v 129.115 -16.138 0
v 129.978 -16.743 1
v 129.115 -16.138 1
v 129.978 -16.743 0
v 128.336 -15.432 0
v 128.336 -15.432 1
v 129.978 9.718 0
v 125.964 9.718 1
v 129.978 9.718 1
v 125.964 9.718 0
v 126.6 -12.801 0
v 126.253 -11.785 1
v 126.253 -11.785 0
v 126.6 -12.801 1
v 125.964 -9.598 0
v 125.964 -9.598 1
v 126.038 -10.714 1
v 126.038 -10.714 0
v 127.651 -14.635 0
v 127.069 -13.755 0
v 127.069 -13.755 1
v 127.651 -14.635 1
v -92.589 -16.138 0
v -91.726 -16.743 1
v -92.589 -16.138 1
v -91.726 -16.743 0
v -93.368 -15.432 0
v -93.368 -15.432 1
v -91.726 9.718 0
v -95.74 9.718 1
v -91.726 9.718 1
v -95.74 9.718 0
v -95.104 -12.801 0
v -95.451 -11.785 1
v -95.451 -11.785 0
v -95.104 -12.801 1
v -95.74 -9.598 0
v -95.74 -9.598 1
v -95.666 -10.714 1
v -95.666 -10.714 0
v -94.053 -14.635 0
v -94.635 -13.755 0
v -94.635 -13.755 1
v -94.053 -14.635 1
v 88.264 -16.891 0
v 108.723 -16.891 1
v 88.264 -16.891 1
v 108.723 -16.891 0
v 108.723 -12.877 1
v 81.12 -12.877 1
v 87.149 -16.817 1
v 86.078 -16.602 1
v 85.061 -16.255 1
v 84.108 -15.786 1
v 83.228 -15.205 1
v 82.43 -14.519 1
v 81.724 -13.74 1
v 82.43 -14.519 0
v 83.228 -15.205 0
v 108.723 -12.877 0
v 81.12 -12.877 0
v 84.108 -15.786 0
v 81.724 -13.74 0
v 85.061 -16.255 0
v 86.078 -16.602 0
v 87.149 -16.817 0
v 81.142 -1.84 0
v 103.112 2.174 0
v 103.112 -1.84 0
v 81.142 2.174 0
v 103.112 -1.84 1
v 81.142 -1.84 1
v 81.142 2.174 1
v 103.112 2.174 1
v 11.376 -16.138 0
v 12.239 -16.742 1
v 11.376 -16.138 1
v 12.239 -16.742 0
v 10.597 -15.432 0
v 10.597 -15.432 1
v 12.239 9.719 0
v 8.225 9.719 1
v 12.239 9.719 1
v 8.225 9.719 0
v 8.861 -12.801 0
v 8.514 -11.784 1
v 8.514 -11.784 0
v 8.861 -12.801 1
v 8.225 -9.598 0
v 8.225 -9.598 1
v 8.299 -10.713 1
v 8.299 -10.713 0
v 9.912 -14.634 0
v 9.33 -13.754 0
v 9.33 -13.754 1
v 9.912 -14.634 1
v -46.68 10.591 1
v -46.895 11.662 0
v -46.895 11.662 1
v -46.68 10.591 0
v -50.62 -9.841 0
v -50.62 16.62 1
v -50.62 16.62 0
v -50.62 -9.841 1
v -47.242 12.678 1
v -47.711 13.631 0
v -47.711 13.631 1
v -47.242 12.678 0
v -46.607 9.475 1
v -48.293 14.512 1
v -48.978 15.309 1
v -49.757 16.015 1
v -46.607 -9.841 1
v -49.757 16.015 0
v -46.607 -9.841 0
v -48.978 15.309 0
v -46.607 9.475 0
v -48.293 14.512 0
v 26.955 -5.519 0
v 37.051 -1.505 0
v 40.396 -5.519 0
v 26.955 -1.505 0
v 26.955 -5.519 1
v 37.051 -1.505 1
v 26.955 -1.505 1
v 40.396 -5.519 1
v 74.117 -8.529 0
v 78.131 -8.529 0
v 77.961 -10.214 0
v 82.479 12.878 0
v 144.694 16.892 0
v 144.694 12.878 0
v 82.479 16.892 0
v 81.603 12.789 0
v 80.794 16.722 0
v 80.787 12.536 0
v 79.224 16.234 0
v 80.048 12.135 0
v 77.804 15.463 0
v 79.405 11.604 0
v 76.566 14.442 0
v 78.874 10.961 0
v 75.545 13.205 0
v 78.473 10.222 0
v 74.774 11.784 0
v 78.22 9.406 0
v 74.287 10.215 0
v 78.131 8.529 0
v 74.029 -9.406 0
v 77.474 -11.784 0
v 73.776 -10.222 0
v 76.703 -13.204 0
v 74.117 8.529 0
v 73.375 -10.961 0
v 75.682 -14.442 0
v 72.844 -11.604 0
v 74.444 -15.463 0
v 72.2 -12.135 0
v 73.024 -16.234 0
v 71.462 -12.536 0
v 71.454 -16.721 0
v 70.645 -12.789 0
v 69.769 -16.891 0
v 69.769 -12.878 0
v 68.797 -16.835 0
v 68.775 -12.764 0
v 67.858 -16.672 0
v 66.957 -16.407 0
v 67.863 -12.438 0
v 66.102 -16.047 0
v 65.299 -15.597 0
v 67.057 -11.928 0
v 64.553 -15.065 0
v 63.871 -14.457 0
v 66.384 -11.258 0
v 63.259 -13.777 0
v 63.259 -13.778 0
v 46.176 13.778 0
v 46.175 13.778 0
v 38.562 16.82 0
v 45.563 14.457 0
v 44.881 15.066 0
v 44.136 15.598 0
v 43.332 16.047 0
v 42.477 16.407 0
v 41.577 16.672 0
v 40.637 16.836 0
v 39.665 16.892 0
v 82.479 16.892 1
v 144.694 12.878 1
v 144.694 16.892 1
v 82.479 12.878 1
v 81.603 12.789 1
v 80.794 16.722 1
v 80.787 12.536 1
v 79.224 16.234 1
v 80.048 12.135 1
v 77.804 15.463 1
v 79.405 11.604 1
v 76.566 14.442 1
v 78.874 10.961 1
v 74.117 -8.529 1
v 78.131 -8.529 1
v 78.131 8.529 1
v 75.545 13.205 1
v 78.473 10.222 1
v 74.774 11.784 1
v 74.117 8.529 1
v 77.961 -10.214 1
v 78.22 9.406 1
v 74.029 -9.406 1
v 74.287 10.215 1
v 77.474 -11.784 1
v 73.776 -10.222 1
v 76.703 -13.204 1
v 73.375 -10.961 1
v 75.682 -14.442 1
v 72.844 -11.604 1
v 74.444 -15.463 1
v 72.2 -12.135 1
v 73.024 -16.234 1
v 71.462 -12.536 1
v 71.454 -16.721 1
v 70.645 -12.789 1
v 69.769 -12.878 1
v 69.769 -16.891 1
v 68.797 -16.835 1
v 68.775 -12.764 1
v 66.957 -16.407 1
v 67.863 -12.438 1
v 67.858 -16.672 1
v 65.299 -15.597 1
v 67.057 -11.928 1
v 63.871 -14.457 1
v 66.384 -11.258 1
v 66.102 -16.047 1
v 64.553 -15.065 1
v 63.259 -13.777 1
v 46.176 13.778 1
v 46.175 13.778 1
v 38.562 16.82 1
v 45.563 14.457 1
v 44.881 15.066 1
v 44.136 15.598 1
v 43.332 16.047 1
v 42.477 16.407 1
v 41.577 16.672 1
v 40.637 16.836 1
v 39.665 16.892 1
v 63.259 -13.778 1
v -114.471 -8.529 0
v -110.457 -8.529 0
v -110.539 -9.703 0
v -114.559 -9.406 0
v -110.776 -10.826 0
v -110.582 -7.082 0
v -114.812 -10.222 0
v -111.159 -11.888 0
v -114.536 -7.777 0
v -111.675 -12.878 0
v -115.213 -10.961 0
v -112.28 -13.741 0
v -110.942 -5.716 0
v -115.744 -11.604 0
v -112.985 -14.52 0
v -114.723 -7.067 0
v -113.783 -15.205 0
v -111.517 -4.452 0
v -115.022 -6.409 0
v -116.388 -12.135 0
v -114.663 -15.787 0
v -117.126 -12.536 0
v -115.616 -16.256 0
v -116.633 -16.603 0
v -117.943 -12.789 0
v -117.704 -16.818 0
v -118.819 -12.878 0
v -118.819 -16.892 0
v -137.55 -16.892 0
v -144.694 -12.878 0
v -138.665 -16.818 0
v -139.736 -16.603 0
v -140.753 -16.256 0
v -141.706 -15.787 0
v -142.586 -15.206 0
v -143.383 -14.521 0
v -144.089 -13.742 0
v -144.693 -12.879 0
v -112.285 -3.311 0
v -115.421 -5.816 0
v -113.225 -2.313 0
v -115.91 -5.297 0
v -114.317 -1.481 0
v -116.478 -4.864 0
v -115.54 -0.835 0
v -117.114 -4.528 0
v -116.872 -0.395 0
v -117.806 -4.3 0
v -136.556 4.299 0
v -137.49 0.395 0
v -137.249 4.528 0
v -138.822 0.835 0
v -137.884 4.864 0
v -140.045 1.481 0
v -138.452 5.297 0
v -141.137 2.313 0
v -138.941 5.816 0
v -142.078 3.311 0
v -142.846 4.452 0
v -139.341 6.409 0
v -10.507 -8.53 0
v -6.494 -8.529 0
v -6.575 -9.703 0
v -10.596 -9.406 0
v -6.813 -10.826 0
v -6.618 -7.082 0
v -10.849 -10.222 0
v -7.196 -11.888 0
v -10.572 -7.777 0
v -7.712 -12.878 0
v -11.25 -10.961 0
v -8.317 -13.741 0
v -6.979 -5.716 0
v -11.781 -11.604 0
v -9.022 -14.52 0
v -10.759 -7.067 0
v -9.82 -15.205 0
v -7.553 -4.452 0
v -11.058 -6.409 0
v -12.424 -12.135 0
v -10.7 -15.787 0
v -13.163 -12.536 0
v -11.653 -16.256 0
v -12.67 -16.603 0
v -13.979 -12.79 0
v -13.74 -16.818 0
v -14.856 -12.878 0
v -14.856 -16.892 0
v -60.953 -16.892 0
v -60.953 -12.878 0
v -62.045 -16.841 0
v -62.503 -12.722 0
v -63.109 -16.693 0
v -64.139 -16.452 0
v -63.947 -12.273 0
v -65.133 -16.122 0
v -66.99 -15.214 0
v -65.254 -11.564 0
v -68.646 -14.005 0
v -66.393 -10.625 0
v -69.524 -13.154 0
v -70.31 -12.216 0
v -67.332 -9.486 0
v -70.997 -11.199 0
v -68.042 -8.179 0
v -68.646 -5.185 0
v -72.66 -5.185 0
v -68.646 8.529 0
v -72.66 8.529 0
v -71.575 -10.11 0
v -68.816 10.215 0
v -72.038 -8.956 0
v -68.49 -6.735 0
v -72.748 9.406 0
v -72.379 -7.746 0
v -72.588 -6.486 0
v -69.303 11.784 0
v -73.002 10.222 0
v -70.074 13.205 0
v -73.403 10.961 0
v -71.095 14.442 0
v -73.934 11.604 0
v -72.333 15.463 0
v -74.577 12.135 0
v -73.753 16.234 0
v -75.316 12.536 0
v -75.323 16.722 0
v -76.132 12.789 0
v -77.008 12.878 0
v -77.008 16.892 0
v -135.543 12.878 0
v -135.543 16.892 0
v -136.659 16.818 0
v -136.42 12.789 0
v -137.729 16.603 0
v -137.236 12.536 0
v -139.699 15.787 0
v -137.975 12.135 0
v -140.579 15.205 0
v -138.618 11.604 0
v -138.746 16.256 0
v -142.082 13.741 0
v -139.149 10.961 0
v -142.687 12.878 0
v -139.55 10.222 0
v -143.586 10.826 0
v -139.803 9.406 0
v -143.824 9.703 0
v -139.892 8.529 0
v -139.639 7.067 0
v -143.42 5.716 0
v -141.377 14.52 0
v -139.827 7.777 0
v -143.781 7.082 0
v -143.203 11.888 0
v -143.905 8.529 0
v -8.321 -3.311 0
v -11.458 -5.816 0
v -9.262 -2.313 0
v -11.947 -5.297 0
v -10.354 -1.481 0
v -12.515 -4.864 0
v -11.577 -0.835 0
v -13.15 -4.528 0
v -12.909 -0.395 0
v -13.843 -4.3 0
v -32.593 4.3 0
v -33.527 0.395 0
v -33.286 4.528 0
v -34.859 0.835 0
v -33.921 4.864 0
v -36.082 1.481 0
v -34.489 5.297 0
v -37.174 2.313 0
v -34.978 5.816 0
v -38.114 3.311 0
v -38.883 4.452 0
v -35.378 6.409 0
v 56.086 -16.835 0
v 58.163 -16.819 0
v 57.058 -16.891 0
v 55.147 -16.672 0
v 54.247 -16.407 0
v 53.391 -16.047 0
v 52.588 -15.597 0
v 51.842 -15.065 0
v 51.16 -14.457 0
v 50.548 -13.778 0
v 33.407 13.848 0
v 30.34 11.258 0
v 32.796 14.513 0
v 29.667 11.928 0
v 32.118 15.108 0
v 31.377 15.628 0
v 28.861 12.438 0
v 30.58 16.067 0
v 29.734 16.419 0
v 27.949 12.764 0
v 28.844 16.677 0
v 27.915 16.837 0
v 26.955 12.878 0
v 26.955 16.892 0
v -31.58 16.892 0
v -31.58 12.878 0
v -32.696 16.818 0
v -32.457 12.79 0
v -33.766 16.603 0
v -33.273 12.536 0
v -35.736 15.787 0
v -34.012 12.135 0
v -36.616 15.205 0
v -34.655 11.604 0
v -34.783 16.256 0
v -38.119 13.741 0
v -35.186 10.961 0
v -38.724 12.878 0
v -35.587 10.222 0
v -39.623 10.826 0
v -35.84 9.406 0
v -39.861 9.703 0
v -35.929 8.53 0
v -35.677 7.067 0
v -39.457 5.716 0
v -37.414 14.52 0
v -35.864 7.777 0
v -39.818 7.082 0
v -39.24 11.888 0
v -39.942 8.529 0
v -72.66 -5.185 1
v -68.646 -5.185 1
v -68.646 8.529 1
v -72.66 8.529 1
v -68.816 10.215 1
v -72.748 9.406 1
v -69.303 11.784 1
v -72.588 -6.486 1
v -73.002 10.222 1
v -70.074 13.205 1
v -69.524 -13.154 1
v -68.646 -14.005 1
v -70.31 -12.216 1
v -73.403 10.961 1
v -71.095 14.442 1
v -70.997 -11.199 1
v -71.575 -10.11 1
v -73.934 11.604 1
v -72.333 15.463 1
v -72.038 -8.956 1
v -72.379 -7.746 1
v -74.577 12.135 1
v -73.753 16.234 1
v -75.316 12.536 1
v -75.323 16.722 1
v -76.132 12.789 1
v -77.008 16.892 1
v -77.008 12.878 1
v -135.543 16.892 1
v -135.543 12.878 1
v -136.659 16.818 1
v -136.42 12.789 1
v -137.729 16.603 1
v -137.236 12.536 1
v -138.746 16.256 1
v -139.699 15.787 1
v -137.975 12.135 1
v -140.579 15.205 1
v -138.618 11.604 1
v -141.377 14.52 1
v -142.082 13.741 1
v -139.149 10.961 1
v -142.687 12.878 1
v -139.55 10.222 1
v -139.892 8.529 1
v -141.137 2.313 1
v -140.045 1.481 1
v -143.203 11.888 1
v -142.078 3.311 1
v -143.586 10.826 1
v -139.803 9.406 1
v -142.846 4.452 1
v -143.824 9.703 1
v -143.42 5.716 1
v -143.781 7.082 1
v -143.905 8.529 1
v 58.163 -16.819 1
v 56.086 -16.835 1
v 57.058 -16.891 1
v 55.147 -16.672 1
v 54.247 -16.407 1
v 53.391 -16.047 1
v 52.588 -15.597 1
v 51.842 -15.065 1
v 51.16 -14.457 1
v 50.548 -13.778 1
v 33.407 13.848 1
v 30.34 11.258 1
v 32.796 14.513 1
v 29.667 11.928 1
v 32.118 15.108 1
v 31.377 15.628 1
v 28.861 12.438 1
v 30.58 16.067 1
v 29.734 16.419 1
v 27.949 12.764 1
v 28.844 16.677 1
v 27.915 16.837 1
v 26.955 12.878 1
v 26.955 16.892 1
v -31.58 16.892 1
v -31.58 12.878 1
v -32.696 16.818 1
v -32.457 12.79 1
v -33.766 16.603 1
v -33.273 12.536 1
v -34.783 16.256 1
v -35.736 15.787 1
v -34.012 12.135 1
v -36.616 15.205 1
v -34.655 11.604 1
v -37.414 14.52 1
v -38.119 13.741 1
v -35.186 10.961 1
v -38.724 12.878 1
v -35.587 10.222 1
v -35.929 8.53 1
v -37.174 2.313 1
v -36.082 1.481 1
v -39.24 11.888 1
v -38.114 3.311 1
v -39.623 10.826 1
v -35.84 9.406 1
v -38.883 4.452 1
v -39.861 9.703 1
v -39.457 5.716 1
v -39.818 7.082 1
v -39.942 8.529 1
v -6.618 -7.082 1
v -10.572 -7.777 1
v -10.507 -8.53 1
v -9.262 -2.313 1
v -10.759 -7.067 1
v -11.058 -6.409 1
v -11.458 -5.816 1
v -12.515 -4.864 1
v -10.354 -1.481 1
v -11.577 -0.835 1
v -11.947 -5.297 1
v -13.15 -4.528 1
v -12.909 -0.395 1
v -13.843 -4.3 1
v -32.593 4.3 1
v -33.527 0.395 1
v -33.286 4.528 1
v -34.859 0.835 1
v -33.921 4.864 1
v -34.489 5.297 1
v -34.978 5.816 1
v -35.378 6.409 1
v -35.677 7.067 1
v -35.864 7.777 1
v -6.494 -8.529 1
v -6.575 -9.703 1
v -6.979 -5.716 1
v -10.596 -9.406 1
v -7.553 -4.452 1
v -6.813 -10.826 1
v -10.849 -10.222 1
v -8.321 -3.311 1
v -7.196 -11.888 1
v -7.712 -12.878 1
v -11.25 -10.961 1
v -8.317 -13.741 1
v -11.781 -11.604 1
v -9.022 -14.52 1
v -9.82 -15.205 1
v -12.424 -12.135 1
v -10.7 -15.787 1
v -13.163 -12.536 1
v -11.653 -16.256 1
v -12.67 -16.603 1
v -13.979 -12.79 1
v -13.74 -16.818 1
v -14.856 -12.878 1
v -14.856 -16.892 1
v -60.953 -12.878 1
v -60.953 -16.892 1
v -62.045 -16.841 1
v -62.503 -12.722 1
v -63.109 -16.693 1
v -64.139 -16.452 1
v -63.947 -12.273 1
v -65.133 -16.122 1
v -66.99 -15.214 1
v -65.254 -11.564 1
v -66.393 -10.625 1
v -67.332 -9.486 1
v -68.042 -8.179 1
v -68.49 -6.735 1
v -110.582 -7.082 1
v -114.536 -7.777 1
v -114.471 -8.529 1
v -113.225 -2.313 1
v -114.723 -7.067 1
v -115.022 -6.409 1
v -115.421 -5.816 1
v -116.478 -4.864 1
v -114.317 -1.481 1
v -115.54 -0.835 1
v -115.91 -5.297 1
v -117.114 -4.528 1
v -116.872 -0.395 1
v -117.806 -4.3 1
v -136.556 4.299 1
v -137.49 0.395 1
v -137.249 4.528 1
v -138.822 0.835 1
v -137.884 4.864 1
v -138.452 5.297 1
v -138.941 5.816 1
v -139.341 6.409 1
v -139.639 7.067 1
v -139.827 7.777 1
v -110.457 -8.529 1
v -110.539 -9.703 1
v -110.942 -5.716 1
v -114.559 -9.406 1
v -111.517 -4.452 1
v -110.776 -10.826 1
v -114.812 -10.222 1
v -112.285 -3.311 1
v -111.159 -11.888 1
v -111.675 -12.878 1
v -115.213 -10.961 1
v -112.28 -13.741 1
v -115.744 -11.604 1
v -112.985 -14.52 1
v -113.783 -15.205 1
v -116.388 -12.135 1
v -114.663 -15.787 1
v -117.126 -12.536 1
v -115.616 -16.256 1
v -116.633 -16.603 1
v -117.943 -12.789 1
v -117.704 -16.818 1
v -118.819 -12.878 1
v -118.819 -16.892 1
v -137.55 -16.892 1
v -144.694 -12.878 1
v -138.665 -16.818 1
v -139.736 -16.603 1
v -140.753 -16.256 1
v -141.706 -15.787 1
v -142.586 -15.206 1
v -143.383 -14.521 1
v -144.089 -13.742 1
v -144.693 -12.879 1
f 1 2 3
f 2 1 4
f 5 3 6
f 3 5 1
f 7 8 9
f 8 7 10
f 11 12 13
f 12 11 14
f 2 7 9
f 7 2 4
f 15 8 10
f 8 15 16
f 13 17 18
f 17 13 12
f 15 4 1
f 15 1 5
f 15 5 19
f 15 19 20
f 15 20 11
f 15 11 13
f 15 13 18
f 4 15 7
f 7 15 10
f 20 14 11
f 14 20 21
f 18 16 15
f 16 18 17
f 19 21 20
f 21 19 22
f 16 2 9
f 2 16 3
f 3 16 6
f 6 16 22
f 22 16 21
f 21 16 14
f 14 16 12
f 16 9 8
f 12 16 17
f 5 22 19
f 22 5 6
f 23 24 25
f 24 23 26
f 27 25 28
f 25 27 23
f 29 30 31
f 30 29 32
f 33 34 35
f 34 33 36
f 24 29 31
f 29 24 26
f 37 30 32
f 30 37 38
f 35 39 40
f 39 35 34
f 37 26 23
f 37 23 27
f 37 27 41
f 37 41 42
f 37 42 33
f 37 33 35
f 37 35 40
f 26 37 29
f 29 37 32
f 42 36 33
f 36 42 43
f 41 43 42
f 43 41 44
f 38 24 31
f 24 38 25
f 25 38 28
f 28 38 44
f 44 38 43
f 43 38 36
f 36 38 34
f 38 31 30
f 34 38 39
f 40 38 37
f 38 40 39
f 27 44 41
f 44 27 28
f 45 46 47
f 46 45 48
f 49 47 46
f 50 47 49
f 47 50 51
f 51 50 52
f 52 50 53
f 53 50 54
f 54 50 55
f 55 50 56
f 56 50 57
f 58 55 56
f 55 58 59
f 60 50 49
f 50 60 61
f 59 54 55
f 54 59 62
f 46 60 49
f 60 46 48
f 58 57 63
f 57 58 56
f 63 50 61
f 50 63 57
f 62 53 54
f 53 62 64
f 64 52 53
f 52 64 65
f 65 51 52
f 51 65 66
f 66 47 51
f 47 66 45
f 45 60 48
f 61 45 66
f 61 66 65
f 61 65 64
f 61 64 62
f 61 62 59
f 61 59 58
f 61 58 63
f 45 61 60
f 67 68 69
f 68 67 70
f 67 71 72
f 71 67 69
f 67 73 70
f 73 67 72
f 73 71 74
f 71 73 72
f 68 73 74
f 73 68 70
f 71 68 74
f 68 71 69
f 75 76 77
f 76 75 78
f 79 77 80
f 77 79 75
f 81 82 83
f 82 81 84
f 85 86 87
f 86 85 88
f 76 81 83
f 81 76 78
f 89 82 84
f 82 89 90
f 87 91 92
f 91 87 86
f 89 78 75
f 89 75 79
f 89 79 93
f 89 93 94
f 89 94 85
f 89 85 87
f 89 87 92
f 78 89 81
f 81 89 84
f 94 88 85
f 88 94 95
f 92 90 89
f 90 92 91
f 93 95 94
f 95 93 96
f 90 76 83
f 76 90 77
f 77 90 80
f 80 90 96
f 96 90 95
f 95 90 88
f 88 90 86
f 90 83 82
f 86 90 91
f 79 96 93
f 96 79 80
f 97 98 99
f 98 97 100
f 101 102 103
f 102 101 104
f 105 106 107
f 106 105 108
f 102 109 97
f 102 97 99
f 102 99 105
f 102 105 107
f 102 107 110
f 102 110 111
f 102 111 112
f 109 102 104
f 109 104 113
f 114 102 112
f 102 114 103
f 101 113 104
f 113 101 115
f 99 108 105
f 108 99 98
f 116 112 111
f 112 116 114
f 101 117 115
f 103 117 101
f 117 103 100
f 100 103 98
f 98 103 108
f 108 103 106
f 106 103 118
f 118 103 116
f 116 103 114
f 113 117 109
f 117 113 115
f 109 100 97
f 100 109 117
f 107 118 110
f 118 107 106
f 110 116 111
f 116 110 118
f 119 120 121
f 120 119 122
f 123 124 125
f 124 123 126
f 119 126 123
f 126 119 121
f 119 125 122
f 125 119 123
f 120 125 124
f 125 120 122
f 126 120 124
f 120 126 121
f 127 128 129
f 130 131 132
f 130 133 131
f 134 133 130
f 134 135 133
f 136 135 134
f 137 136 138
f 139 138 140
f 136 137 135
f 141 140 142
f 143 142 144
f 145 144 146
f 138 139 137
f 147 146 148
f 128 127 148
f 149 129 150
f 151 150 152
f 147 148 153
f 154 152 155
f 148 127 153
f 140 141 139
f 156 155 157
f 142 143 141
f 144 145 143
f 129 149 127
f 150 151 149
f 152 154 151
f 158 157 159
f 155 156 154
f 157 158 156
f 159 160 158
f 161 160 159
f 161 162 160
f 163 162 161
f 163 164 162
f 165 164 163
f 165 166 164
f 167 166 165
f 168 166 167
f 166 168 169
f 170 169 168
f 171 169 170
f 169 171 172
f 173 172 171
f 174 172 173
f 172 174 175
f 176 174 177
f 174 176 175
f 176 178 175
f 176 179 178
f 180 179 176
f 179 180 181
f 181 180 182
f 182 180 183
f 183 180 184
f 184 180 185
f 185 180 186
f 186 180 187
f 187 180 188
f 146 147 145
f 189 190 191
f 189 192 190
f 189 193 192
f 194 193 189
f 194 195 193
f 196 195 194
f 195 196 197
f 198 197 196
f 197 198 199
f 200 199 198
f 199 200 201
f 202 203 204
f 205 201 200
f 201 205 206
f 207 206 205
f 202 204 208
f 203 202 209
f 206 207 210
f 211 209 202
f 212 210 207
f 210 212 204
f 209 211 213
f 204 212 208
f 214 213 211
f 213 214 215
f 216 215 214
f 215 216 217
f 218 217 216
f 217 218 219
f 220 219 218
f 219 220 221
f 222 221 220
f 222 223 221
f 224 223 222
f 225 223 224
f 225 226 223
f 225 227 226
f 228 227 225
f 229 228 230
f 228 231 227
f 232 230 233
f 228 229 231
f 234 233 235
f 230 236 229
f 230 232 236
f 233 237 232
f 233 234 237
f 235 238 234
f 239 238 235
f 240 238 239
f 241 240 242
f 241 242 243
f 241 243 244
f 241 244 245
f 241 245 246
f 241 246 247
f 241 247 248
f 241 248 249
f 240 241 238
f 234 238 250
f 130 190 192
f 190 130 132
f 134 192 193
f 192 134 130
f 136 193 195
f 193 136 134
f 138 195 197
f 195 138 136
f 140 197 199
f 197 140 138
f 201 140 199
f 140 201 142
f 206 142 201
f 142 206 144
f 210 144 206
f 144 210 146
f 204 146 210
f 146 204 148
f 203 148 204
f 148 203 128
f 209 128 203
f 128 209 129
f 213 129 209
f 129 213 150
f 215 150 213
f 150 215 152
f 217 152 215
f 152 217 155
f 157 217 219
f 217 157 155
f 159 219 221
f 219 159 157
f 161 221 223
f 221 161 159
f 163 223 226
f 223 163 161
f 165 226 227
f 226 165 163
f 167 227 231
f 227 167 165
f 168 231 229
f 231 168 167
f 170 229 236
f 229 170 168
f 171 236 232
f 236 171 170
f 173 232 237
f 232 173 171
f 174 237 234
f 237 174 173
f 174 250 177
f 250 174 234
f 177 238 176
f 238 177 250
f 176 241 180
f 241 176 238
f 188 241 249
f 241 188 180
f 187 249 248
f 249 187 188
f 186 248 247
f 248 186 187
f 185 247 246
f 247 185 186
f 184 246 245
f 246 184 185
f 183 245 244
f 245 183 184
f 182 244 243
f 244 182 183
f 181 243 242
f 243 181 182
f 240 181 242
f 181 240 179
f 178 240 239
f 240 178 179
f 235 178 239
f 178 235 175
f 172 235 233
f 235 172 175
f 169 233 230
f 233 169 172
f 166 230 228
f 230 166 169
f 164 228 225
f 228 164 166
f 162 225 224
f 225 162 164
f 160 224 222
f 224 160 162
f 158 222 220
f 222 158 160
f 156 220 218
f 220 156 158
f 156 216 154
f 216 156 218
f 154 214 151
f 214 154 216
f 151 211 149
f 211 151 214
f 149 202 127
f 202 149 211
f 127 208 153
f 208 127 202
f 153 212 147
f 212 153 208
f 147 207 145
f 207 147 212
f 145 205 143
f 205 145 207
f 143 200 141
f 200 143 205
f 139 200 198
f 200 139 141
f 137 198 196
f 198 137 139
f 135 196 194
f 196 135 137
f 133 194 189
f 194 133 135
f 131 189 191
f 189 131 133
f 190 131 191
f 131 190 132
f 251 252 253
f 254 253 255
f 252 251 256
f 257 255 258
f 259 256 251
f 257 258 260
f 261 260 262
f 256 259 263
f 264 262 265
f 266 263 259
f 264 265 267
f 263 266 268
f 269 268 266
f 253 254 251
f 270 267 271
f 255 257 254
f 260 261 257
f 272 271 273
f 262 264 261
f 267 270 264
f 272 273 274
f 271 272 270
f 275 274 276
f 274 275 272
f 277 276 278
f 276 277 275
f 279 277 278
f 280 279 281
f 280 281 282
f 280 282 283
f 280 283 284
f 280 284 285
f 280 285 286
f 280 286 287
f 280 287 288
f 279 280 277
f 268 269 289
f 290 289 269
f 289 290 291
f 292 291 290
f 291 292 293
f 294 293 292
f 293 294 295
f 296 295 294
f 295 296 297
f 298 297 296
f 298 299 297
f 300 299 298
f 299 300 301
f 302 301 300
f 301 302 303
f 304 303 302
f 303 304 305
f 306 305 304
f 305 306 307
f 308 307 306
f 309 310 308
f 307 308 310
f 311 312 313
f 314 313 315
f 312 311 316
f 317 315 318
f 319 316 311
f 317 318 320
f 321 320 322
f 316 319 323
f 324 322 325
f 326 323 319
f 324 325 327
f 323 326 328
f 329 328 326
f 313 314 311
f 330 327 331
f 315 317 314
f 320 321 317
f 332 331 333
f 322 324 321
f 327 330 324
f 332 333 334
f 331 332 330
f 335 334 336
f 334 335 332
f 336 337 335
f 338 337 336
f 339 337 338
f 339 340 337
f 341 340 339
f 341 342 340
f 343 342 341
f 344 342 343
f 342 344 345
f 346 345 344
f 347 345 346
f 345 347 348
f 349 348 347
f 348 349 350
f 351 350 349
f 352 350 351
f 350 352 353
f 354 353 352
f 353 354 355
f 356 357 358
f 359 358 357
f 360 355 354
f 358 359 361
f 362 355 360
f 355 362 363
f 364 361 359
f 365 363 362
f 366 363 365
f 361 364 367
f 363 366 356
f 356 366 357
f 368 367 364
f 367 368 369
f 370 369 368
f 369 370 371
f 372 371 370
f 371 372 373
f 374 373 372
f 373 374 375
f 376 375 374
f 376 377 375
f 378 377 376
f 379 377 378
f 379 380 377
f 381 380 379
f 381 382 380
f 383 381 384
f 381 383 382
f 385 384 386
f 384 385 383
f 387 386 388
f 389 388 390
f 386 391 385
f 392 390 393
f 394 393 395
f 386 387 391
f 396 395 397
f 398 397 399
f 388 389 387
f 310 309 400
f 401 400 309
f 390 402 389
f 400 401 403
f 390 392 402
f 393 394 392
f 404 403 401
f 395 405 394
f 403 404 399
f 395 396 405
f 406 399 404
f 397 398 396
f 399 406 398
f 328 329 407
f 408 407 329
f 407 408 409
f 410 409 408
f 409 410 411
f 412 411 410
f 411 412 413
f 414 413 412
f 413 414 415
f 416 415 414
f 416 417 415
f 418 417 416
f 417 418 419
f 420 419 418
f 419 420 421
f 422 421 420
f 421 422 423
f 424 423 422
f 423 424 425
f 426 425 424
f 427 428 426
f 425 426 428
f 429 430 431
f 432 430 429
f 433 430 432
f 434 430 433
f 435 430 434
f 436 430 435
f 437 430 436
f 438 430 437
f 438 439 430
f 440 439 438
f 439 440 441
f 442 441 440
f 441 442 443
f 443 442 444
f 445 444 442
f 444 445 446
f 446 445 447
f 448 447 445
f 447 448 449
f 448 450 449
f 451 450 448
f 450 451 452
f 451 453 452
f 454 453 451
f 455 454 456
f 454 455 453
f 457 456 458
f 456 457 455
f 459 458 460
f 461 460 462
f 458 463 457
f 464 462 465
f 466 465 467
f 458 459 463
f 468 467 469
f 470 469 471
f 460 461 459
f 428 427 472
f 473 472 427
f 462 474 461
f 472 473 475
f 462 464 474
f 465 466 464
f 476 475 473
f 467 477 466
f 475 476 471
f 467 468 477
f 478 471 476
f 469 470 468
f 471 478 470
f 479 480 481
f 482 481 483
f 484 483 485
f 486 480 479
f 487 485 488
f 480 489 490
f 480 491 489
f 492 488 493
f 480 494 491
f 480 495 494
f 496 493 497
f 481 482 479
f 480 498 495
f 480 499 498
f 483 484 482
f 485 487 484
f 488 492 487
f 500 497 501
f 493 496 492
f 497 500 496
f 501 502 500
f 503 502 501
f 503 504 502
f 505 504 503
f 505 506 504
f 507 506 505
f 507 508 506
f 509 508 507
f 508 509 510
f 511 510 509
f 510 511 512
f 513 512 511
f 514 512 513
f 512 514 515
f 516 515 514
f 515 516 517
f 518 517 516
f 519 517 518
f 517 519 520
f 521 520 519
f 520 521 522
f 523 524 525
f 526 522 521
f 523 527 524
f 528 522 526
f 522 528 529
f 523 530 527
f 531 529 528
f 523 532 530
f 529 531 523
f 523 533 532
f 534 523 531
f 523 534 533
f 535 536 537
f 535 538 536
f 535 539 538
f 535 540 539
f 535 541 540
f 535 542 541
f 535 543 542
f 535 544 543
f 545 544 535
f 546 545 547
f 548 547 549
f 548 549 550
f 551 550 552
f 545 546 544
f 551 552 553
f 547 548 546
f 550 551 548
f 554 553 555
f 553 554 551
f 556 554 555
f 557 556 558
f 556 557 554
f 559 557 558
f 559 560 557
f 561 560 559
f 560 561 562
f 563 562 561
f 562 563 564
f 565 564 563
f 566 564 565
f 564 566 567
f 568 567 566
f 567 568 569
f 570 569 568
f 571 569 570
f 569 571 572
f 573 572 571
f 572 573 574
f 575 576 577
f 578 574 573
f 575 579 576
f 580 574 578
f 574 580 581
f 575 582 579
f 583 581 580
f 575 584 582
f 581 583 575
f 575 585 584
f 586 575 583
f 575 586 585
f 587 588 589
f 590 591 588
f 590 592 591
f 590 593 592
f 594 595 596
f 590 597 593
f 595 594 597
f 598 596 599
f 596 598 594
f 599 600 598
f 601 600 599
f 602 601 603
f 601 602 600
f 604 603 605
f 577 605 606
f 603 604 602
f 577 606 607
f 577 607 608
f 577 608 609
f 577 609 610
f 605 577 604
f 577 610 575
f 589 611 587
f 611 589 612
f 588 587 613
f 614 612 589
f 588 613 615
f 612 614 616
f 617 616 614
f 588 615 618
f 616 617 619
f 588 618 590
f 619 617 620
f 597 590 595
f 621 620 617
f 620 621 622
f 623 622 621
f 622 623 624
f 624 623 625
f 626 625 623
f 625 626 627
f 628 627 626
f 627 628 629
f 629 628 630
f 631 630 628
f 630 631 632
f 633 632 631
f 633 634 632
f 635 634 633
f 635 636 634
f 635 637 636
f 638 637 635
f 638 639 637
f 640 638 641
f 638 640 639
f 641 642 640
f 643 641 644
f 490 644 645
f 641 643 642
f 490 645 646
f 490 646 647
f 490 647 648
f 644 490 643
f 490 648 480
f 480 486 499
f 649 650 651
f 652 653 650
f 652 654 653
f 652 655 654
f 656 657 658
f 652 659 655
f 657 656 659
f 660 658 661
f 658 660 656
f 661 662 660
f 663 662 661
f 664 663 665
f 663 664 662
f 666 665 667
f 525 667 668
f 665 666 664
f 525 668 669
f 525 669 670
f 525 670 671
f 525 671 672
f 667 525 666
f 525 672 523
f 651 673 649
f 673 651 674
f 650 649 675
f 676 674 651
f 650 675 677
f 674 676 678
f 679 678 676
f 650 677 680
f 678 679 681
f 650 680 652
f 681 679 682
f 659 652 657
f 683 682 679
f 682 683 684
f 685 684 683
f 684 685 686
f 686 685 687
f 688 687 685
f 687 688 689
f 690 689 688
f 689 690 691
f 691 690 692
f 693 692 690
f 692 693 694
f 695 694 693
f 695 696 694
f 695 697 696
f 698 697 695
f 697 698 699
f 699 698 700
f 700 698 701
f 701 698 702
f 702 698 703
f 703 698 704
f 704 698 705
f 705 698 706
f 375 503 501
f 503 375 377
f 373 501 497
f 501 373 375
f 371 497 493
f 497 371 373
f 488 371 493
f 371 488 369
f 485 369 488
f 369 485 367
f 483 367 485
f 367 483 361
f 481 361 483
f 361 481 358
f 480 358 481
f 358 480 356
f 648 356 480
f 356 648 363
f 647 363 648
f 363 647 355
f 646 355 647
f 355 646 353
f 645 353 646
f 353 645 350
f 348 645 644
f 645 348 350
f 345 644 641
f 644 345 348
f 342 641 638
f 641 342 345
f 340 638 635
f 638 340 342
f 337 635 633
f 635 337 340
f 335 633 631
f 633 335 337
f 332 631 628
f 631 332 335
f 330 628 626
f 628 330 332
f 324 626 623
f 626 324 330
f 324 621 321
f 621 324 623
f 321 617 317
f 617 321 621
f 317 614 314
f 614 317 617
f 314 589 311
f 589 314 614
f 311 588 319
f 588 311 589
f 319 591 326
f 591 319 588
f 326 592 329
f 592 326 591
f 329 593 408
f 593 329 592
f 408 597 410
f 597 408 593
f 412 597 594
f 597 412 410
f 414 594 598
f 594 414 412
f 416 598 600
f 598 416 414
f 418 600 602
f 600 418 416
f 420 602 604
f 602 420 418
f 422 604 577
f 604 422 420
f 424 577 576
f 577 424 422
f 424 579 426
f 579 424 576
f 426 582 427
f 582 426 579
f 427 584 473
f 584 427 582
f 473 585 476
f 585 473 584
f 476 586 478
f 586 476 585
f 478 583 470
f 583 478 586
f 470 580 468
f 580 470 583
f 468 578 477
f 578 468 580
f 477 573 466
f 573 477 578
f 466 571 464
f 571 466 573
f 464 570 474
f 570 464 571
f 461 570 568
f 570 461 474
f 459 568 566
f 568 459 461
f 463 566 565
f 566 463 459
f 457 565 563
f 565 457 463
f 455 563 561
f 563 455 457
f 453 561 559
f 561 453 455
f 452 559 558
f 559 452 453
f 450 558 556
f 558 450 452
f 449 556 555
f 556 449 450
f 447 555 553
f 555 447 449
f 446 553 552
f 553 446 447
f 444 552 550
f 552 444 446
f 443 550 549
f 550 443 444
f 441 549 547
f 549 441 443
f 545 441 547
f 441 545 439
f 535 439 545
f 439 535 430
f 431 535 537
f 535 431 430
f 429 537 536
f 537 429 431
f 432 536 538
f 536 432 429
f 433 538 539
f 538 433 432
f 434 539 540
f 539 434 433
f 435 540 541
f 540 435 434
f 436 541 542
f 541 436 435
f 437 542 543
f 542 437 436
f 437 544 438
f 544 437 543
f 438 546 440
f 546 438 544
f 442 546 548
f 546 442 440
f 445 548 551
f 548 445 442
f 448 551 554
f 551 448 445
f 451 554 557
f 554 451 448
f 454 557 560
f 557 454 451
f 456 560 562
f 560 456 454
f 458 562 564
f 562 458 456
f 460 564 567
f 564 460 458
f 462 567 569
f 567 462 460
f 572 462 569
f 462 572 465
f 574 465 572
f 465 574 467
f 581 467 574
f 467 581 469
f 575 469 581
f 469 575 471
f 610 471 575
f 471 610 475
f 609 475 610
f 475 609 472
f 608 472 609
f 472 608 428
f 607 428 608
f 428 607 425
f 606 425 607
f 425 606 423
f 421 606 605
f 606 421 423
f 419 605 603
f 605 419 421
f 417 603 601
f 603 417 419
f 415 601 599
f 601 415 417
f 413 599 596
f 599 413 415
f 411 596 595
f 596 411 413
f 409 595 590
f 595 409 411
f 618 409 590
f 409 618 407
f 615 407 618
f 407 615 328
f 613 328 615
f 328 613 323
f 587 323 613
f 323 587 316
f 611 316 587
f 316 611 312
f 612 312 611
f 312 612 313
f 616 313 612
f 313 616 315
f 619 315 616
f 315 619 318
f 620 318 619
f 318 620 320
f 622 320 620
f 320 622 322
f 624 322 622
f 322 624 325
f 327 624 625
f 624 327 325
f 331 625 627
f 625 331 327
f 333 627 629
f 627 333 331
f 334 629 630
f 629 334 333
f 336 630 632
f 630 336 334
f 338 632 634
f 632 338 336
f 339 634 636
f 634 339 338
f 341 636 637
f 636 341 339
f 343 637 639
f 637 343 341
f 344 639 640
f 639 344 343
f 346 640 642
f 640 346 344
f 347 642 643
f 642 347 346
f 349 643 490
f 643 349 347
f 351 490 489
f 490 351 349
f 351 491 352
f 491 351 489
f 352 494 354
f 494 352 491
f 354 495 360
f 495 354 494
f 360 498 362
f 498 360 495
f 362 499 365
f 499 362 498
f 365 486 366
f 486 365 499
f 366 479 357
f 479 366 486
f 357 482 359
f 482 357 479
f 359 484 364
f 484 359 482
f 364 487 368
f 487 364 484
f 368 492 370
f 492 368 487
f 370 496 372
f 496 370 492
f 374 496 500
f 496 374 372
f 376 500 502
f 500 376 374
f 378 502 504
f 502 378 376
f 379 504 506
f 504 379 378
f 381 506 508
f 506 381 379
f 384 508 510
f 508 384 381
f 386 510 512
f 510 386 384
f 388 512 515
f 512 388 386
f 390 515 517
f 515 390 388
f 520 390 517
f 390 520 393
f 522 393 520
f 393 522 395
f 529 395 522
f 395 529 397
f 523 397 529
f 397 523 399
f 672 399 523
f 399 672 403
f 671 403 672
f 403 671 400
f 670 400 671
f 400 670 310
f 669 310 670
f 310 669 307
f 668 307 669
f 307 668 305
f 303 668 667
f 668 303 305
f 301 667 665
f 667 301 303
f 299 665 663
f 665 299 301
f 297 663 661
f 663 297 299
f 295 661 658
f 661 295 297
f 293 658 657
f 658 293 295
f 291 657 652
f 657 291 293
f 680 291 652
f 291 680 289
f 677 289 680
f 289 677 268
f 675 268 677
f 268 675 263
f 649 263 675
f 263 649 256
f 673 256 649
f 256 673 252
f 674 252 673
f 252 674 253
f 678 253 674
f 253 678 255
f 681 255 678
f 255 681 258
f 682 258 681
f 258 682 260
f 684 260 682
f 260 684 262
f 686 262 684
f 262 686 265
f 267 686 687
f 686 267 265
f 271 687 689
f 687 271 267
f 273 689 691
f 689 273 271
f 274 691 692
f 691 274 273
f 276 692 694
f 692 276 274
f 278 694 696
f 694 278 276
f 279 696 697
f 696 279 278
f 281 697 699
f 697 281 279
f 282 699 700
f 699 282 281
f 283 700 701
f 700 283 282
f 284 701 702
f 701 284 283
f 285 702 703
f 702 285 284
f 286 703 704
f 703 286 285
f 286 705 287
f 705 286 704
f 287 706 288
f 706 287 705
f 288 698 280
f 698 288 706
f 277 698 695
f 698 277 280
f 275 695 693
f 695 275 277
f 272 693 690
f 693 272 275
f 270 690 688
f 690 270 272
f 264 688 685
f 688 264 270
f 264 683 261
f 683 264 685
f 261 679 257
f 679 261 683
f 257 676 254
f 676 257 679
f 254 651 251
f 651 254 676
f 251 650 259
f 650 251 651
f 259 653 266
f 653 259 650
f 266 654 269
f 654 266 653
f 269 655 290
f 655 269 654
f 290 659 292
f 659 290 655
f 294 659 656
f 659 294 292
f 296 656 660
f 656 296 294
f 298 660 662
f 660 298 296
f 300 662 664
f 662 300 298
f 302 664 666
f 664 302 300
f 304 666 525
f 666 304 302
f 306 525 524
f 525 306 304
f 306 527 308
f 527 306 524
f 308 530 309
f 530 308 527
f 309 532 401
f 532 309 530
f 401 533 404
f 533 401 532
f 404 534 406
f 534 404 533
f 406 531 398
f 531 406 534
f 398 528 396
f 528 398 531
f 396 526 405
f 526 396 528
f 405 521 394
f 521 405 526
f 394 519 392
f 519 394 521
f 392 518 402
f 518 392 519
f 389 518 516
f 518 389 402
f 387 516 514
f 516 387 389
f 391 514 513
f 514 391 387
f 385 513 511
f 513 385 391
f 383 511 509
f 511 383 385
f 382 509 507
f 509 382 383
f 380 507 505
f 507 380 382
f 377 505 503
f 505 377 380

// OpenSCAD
/**
 * 2018-2018 Johannes Walcher
 * 
 * StuStaNet common tools
 */

module stustanet_logo(height=1, width=270, center=0) {
module poly_path75(h)
{
  scale([25.4/90, -25.4/90, 1]) union()
  {
    linear_extrude(height=h)
      polygon([[414.497196,53.392017],[411.743727,51.464387],[409.259445,49.213582],[407.074538,46.669727],[405.219193,43.862947],[403.723599,40.823367],[402.617942,37.581112],[401.932411,34.166307],[401.697192,30.609076],[401.697192,-30.990943],[414.497196,-30.990943],[414.497196,53.388817]]);
  }
}

module poly_path85(h)
{
  scale([25.4/90, -25.4/90, 1]) union()
  {
    linear_extrude(height=h)
      polygon([[-292.511025,53.392017],[-295.264801,51.464387],[-297.749226,49.213582],[-299.934152,46.669727],[-301.789428,43.862947],[-303.284903,40.823367],[-304.390428,37.581112],[-305.075854,34.166307],[-305.311029,30.609076],[-305.311029,-30.990943],[-292.511025,-30.990943],[-292.511025,53.388817]]);
  }
}

module poly_path77(h)
{
  scale([25.4/90, -25.4/90, 1]) union()
  {
    linear_extrude(height=h)
      polygon([[258.689148,41.064546],[260.616777,43.818016],[262.867582,46.302298],[265.411437,48.487205],[268.218217,50.342549],[271.257797,51.838143],[274.500052,52.943800],[277.914858,53.629331],[281.472088,53.864550],[346.713708,53.864550],[346.713708,41.064546],[258.691281,41.064546]]);
  }
}

module poly_polygon11(h)
{
  scale([25.4/90, -25.4/90, 1]) union()
  {
    linear_extrude(height=h)
      polygon([[-99.016564,-69.866688],[14.137604,69.866688],[128.138707,69.866688],[14.984538,-69.866688]]);
  }
}

module poly_rect71(h)
{
  scale([25.4/90, -25.4/90, 1]) union()
  {
    linear_extrude(height=h)
      polygon([[258.758481,-6.933335],[328.822501,-6.933335],[328.822501,5.866669],[258.758481,5.866669]]);
  }
}

module poly_polygon13(h)
{
  scale([25.4/90, -25.4/90, 1]) union()
  {
    linear_extrude(height=h)
      polygon([[-237.684341,-69.866688],[-124.532306,69.866688],[-10.526937,69.866688],[-123.678972,-69.866688]]);
  }
}

module poly_path87(h)
{
  scale([25.4/90, -25.4/90, 1]) union()
  {
    linear_extrude(height=h)
      polygon([[39.030412,53.389883],[36.276943,51.462254],[33.792661,49.211449],[31.607754,46.667594],[29.752409,43.860814],[28.256815,40.821234],[27.151158,37.578978],[26.465627,34.164173],[26.230408,30.606943],[26.230408,-30.993076],[39.030412,-30.993076],[39.030412,53.386683]]);
  }
}

module poly_path89(h)
{
  scale([25.4/90, -25.4/90, 1]) union()
  {
    linear_extrude(height=h)
      polygon([[-161.427250,-52.999483],[-158.673781,-51.071853],[-156.189499,-48.821049],[-154.004592,-46.277194],[-152.149248,-43.470414],[-150.653653,-40.430833],[-149.547997,-37.188578],[-148.862465,-33.773773],[-148.627246,-30.216543],[-148.627246,31.383476],[-161.427250,31.383476],[-161.427250,-52.996283]]);
  }
}

module poly_polygon7(h)
{
  scale([25.4/90, -25.4/90, 1]) union()
  {
    linear_extrude(height=h)
      polygon([[178.318989,-69.866688],[291.472091,69.866688],[405.471060,69.866688],[292.316891,-69.866688]]);
  }
}

module poly_polygon81(h)
{
  scale([25.4/90, -25.4/90, 1]) union()
  {
    linear_extrude(height=h)
      polygon([[85.958427,4.800002],[118.155770,4.800002],[128.822440,17.600006],[85.958427,17.600006]]);
  }
}

module poly_path73(h)
{
  scale([25.4/90, -25.4/90, 1]) union()
  {
    linear_extrude(height=h)
      polygon([[461.425211,-41.066679],[461.425211,-53.866684],[354.758511,-53.866684],[263.025149,-53.866684],[257.650614,-53.324906],[252.644879,-51.771066],[248.115144,-49.312401],[244.168610,-46.056148],[240.912475,-42.109544],[238.453941,-37.579828],[236.900207,-32.574237],[236.358474,-27.200009],[236.358474,27.200008],[236.076765,29.994718],[235.268807,32.597677],[233.990348,34.953136],[232.297139,37.005345],[230.244930,38.698554],[227.889471,39.977012],[225.286512,40.784971],[222.491803,41.066680],[219.322519,40.702646],[216.411934,39.665612],[213.842350,38.038179],[211.696066,35.902945],[147.253379,-43.937080],[147.252313,-43.937080],[145.300808,-46.102631],[143.125878,-48.043682],[140.747298,-49.740432],[138.184843,-51.173083],[135.458288,-52.321833],[132.587408,-53.166883],[129.591978,-53.688433],[126.491773,-53.866684],[122.973905,-53.637350],[201.730196,43.936014],[201.730196,43.937080],[203.681791,46.102279],[205.856948,48.043065],[208.235830,49.739626],[210.798599,51.172149],[213.525419,52.320823],[216.396451,53.165833],[219.391858,53.687369],[222.491803,53.865617],[227.866032,53.323840],[232.871623,51.770000],[237.401339,49.311334],[241.347942,46.055081],[244.604195,42.108478],[247.062861,37.578762],[248.616701,32.573171],[249.158478,27.198942],[249.158478,-27.200009],[249.440186,-29.994718],[250.248145,-32.597677],[251.526604,-34.953136],[253.219812,-37.005345],[255.272021,-38.698554],[257.627481,-39.977012],[260.230440,-40.784971],[263.025149,-41.066679],[354.956911,-41.066679]]);
  }
}

module poly_polygon9(h)
{
  scale([25.4/90, -25.4/90, 1]) union()
  {
    linear_extrude(height=h)
      polygon([[39.651212,-69.866688],[152.805381,69.866688],[266.804350,69.866688],[153.651248,-69.866688]]);
  }
}

module poly_path83(h)
{
  scale([25.4/90, -25.4/90, 1]) union()
  {
    linear_extrude(height=h)
      polygon([[185.480591,53.636283],[106.535500,-44.162147],[104.586981,-46.280971],[102.422149,-48.179132],[100.060092,-49.837568],[97.519897,-51.237216],[94.820653,-52.359014],[91.981445,-53.183900],[89.021363,-53.692811],[85.959494,-53.866684],[-3.485868,-53.866684],[-100.708298,-53.866684],[-104.265218,-53.631508],[-107.679850,-52.946083],[-110.922008,-51.840558],[-113.961502,-50.345082],[-116.768147,-48.489807],[-119.311754,-46.304881],[-121.562136,-43.820455],[-123.489105,-41.066679],[-125.136222,-37.909712],[-126.356439,-34.522944],[-127.114456,-30.941376],[-127.374973,-27.200009],[-126.977142,-22.585474],[-125.828323,-18.228939],[-123.995528,-14.197404],[-121.545771,-10.557870],[-118.546064,-7.377336],[-115.063419,-4.722801],[-111.164849,-2.661267],[-106.917367,-1.259734],[-44.145080,13.712004],[-41.936234,14.440800],[-39.908912,15.512772],[-38.097941,16.893093],[-36.538145,18.546939],[-35.264349,20.439486],[-34.311377,22.535907],[-33.714056,24.801379],[-33.507210,27.201075],[-33.788919,29.995784],[-34.596877,32.598744],[-35.875336,34.954203],[-37.568545,37.006412],[-39.620754,38.699620],[-41.976213,39.978079],[-44.579172,40.786038],[-47.373881,41.067746],[-194.377661,41.067746],[-199.321816,40.569336],[-203.926897,39.139862],[-208.094228,36.877964],[-211.725133,33.882277],[-214.720938,30.251441],[-216.982968,26.084091],[-218.412547,21.478867],[-218.911002,16.534405],[-218.911002,-27.200009],[-219.452779,-32.574237],[-221.006619,-37.579828],[-223.465284,-42.109544],[-226.721538,-46.056148],[-230.668141,-49.312401],[-235.197857,-51.771066],[-240.203448,-53.324906],[-245.577677,-53.866684],[-432.244402,-53.866684],[-435.801234,-53.631465],[-439.215654,-52.945933],[-442.457549,-51.840277],[-445.496806,-50.344682],[-448.303313,-48.489338],[-450.846958,-46.304431],[-453.097627,-43.820149],[-455.025209,-41.066679],[-456.672326,-37.909712],[-457.892543,-34.522944],[-458.650560,-30.941376],[-458.911077,-27.200009],[-458.513289,-22.585474],[-457.364576,-18.228939],[-455.531913,-14.197404],[-453.082275,-10.557870],[-450.082636,-7.377336],[-446.599973,-4.722801],[-442.701259,-2.661267],[-438.453470,-1.259734],[-375.681184,13.712004],[-373.472690,14.440755],[-371.445633,15.512605],[-369.634851,16.892755],[-368.075182,18.546406],[-366.801463,20.438756],[-365.848531,22.535007],[-365.251225,24.800358],[-365.044381,27.200008],[-365.326089,29.994718],[-366.134048,32.597677],[-367.412506,34.953136],[-369.105715,37.005345],[-371.157924,38.698554],[-373.513383,39.977012],[-376.116343,40.784971],[-378.911052,41.066680],[-461.425211,41.066680],[-461.424144,41.069880],[-459.496871,43.822905],[-457.246360,46.306681],[-454.702773,48.491057],[-451.896275,50.345882],[-448.857026,51.841008],[-445.615189,52.946283],[-442.200928,53.631558],[-438.644404,53.866684],[-378.911052,53.866684],[-375.354176,53.631465],[-371.939650,52.945933],[-368.697624,51.840277],[-365.658248,50.344682],[-362.851672,48.489338],[-360.308046,46.304431],[-358.057520,43.820149],[-356.130245,41.066680],[-354.483127,37.909712],[-353.262910,34.522944],[-352.504893,30.941376],[-352.244377,27.200008],[-352.642164,22.585474],[-353.790877,18.228939],[-355.623540,14.197404],[-358.073179,10.557870],[-361.072817,7.377336],[-364.555481,4.722801],[-368.454194,2.661267],[-372.701983,1.259734],[-435.473203,-13.710938],[-437.682356,-14.440040],[-439.709821,-15.512155],[-441.520811,-16.892495],[-443.080538,-18.546272],[-444.354216,-20.438700],[-445.307056,-22.534990],[-445.904271,-24.800356],[-446.111073,-27.200009],[-445.829364,-29.994718],[-445.021406,-32.597677],[-443.742947,-34.953136],[-442.049738,-37.005345],[-439.997529,-38.698554],[-437.642070,-39.977012],[-435.039111,-40.784971],[-432.244402,-41.066679],[-245.577677,-41.066679],[-242.782968,-40.784971],[-240.180008,-39.977012],[-237.824549,-38.698554],[-235.772340,-37.005345],[-234.079131,-34.953136],[-232.800673,-32.597677],[-231.992714,-29.994718],[-231.711006,-27.200009],[-231.711006,16.533338],[-231.482568,20.683934],[-230.813505,24.701291],[-229.728193,28.561374],[-228.251005,32.240143],[-226.406317,35.713563],[-224.218503,38.957596],[-221.711940,41.948203],[-218.911002,44.661347],[-213.630917,48.516182],[-207.707132,51.412016],[-204.538945,52.464371],[-201.251946,53.233850],[-197.860172,53.706079],[-194.377661,53.866684],[-47.374948,53.866684],[-43.818072,53.631465],[-40.403546,52.945933],[-37.161520,51.840277],[-34.122144,50.344682],[-31.315568,48.489338],[-28.771942,46.304431],[-26.521417,43.820149],[-24.594141,41.066680],[-22.947024,37.909712],[-21.726807,34.522944],[-20.968790,30.941376],[-20.708273,27.200008],[-21.106061,22.585474],[-22.254774,18.228939],[-24.087437,14.197404],[-26.537075,10.557870],[-29.536713,7.377336],[-33.019377,4.722801],[-36.918091,2.661267],[-41.165880,1.259734],[-103.938166,-13.712004],[-106.147319,-14.440800],[-108.174784,-15.512772],[-109.985774,-16.893093],[-111.545502,-18.546939],[-112.819179,-20.439486],[-113.772019,-22.535907],[-114.369234,-24.801379],[-114.576036,-27.201075],[-114.294327,-29.995784],[-113.486369,-32.598744],[-112.207910,-34.954203],[-110.514701,-37.006412],[-108.462492,-38.699620],[-106.107033,-39.978079],[-103.504074,-40.786038],[-100.709365,-41.067746],[85.958427,-41.067746],[89.128145,-40.703513],[92.038562,-39.665879],[94.607580,-38.037445],[96.753097,-35.900811],[161.195784,43.937080],[163.147378,46.102279],[165.322535,48.043065],[167.701417,49.739626],[170.264187,51.172149],[172.991006,52.320823],[175.862038,53.165833],[178.857445,53.687369],[181.957390,53.865617],[185.480591,53.636283]]);
  }
}

factor = width/270;

dx=260/2;
dy=15;
center_factor = (center * -1) + 1;

scale([factor, factor, 1])
translate([center_factor * dx, center_factor * dy, 0])
{
poly_path75(height);
poly_path85(height);
poly_path77(height);
poly_rect71(height);
poly_path87(height);
poly_path89(height);
poly_polygon81(height);
poly_path73(height);
poly_path83(height);
}
}


stustanet_logo(height=1, width=300, center=1);
